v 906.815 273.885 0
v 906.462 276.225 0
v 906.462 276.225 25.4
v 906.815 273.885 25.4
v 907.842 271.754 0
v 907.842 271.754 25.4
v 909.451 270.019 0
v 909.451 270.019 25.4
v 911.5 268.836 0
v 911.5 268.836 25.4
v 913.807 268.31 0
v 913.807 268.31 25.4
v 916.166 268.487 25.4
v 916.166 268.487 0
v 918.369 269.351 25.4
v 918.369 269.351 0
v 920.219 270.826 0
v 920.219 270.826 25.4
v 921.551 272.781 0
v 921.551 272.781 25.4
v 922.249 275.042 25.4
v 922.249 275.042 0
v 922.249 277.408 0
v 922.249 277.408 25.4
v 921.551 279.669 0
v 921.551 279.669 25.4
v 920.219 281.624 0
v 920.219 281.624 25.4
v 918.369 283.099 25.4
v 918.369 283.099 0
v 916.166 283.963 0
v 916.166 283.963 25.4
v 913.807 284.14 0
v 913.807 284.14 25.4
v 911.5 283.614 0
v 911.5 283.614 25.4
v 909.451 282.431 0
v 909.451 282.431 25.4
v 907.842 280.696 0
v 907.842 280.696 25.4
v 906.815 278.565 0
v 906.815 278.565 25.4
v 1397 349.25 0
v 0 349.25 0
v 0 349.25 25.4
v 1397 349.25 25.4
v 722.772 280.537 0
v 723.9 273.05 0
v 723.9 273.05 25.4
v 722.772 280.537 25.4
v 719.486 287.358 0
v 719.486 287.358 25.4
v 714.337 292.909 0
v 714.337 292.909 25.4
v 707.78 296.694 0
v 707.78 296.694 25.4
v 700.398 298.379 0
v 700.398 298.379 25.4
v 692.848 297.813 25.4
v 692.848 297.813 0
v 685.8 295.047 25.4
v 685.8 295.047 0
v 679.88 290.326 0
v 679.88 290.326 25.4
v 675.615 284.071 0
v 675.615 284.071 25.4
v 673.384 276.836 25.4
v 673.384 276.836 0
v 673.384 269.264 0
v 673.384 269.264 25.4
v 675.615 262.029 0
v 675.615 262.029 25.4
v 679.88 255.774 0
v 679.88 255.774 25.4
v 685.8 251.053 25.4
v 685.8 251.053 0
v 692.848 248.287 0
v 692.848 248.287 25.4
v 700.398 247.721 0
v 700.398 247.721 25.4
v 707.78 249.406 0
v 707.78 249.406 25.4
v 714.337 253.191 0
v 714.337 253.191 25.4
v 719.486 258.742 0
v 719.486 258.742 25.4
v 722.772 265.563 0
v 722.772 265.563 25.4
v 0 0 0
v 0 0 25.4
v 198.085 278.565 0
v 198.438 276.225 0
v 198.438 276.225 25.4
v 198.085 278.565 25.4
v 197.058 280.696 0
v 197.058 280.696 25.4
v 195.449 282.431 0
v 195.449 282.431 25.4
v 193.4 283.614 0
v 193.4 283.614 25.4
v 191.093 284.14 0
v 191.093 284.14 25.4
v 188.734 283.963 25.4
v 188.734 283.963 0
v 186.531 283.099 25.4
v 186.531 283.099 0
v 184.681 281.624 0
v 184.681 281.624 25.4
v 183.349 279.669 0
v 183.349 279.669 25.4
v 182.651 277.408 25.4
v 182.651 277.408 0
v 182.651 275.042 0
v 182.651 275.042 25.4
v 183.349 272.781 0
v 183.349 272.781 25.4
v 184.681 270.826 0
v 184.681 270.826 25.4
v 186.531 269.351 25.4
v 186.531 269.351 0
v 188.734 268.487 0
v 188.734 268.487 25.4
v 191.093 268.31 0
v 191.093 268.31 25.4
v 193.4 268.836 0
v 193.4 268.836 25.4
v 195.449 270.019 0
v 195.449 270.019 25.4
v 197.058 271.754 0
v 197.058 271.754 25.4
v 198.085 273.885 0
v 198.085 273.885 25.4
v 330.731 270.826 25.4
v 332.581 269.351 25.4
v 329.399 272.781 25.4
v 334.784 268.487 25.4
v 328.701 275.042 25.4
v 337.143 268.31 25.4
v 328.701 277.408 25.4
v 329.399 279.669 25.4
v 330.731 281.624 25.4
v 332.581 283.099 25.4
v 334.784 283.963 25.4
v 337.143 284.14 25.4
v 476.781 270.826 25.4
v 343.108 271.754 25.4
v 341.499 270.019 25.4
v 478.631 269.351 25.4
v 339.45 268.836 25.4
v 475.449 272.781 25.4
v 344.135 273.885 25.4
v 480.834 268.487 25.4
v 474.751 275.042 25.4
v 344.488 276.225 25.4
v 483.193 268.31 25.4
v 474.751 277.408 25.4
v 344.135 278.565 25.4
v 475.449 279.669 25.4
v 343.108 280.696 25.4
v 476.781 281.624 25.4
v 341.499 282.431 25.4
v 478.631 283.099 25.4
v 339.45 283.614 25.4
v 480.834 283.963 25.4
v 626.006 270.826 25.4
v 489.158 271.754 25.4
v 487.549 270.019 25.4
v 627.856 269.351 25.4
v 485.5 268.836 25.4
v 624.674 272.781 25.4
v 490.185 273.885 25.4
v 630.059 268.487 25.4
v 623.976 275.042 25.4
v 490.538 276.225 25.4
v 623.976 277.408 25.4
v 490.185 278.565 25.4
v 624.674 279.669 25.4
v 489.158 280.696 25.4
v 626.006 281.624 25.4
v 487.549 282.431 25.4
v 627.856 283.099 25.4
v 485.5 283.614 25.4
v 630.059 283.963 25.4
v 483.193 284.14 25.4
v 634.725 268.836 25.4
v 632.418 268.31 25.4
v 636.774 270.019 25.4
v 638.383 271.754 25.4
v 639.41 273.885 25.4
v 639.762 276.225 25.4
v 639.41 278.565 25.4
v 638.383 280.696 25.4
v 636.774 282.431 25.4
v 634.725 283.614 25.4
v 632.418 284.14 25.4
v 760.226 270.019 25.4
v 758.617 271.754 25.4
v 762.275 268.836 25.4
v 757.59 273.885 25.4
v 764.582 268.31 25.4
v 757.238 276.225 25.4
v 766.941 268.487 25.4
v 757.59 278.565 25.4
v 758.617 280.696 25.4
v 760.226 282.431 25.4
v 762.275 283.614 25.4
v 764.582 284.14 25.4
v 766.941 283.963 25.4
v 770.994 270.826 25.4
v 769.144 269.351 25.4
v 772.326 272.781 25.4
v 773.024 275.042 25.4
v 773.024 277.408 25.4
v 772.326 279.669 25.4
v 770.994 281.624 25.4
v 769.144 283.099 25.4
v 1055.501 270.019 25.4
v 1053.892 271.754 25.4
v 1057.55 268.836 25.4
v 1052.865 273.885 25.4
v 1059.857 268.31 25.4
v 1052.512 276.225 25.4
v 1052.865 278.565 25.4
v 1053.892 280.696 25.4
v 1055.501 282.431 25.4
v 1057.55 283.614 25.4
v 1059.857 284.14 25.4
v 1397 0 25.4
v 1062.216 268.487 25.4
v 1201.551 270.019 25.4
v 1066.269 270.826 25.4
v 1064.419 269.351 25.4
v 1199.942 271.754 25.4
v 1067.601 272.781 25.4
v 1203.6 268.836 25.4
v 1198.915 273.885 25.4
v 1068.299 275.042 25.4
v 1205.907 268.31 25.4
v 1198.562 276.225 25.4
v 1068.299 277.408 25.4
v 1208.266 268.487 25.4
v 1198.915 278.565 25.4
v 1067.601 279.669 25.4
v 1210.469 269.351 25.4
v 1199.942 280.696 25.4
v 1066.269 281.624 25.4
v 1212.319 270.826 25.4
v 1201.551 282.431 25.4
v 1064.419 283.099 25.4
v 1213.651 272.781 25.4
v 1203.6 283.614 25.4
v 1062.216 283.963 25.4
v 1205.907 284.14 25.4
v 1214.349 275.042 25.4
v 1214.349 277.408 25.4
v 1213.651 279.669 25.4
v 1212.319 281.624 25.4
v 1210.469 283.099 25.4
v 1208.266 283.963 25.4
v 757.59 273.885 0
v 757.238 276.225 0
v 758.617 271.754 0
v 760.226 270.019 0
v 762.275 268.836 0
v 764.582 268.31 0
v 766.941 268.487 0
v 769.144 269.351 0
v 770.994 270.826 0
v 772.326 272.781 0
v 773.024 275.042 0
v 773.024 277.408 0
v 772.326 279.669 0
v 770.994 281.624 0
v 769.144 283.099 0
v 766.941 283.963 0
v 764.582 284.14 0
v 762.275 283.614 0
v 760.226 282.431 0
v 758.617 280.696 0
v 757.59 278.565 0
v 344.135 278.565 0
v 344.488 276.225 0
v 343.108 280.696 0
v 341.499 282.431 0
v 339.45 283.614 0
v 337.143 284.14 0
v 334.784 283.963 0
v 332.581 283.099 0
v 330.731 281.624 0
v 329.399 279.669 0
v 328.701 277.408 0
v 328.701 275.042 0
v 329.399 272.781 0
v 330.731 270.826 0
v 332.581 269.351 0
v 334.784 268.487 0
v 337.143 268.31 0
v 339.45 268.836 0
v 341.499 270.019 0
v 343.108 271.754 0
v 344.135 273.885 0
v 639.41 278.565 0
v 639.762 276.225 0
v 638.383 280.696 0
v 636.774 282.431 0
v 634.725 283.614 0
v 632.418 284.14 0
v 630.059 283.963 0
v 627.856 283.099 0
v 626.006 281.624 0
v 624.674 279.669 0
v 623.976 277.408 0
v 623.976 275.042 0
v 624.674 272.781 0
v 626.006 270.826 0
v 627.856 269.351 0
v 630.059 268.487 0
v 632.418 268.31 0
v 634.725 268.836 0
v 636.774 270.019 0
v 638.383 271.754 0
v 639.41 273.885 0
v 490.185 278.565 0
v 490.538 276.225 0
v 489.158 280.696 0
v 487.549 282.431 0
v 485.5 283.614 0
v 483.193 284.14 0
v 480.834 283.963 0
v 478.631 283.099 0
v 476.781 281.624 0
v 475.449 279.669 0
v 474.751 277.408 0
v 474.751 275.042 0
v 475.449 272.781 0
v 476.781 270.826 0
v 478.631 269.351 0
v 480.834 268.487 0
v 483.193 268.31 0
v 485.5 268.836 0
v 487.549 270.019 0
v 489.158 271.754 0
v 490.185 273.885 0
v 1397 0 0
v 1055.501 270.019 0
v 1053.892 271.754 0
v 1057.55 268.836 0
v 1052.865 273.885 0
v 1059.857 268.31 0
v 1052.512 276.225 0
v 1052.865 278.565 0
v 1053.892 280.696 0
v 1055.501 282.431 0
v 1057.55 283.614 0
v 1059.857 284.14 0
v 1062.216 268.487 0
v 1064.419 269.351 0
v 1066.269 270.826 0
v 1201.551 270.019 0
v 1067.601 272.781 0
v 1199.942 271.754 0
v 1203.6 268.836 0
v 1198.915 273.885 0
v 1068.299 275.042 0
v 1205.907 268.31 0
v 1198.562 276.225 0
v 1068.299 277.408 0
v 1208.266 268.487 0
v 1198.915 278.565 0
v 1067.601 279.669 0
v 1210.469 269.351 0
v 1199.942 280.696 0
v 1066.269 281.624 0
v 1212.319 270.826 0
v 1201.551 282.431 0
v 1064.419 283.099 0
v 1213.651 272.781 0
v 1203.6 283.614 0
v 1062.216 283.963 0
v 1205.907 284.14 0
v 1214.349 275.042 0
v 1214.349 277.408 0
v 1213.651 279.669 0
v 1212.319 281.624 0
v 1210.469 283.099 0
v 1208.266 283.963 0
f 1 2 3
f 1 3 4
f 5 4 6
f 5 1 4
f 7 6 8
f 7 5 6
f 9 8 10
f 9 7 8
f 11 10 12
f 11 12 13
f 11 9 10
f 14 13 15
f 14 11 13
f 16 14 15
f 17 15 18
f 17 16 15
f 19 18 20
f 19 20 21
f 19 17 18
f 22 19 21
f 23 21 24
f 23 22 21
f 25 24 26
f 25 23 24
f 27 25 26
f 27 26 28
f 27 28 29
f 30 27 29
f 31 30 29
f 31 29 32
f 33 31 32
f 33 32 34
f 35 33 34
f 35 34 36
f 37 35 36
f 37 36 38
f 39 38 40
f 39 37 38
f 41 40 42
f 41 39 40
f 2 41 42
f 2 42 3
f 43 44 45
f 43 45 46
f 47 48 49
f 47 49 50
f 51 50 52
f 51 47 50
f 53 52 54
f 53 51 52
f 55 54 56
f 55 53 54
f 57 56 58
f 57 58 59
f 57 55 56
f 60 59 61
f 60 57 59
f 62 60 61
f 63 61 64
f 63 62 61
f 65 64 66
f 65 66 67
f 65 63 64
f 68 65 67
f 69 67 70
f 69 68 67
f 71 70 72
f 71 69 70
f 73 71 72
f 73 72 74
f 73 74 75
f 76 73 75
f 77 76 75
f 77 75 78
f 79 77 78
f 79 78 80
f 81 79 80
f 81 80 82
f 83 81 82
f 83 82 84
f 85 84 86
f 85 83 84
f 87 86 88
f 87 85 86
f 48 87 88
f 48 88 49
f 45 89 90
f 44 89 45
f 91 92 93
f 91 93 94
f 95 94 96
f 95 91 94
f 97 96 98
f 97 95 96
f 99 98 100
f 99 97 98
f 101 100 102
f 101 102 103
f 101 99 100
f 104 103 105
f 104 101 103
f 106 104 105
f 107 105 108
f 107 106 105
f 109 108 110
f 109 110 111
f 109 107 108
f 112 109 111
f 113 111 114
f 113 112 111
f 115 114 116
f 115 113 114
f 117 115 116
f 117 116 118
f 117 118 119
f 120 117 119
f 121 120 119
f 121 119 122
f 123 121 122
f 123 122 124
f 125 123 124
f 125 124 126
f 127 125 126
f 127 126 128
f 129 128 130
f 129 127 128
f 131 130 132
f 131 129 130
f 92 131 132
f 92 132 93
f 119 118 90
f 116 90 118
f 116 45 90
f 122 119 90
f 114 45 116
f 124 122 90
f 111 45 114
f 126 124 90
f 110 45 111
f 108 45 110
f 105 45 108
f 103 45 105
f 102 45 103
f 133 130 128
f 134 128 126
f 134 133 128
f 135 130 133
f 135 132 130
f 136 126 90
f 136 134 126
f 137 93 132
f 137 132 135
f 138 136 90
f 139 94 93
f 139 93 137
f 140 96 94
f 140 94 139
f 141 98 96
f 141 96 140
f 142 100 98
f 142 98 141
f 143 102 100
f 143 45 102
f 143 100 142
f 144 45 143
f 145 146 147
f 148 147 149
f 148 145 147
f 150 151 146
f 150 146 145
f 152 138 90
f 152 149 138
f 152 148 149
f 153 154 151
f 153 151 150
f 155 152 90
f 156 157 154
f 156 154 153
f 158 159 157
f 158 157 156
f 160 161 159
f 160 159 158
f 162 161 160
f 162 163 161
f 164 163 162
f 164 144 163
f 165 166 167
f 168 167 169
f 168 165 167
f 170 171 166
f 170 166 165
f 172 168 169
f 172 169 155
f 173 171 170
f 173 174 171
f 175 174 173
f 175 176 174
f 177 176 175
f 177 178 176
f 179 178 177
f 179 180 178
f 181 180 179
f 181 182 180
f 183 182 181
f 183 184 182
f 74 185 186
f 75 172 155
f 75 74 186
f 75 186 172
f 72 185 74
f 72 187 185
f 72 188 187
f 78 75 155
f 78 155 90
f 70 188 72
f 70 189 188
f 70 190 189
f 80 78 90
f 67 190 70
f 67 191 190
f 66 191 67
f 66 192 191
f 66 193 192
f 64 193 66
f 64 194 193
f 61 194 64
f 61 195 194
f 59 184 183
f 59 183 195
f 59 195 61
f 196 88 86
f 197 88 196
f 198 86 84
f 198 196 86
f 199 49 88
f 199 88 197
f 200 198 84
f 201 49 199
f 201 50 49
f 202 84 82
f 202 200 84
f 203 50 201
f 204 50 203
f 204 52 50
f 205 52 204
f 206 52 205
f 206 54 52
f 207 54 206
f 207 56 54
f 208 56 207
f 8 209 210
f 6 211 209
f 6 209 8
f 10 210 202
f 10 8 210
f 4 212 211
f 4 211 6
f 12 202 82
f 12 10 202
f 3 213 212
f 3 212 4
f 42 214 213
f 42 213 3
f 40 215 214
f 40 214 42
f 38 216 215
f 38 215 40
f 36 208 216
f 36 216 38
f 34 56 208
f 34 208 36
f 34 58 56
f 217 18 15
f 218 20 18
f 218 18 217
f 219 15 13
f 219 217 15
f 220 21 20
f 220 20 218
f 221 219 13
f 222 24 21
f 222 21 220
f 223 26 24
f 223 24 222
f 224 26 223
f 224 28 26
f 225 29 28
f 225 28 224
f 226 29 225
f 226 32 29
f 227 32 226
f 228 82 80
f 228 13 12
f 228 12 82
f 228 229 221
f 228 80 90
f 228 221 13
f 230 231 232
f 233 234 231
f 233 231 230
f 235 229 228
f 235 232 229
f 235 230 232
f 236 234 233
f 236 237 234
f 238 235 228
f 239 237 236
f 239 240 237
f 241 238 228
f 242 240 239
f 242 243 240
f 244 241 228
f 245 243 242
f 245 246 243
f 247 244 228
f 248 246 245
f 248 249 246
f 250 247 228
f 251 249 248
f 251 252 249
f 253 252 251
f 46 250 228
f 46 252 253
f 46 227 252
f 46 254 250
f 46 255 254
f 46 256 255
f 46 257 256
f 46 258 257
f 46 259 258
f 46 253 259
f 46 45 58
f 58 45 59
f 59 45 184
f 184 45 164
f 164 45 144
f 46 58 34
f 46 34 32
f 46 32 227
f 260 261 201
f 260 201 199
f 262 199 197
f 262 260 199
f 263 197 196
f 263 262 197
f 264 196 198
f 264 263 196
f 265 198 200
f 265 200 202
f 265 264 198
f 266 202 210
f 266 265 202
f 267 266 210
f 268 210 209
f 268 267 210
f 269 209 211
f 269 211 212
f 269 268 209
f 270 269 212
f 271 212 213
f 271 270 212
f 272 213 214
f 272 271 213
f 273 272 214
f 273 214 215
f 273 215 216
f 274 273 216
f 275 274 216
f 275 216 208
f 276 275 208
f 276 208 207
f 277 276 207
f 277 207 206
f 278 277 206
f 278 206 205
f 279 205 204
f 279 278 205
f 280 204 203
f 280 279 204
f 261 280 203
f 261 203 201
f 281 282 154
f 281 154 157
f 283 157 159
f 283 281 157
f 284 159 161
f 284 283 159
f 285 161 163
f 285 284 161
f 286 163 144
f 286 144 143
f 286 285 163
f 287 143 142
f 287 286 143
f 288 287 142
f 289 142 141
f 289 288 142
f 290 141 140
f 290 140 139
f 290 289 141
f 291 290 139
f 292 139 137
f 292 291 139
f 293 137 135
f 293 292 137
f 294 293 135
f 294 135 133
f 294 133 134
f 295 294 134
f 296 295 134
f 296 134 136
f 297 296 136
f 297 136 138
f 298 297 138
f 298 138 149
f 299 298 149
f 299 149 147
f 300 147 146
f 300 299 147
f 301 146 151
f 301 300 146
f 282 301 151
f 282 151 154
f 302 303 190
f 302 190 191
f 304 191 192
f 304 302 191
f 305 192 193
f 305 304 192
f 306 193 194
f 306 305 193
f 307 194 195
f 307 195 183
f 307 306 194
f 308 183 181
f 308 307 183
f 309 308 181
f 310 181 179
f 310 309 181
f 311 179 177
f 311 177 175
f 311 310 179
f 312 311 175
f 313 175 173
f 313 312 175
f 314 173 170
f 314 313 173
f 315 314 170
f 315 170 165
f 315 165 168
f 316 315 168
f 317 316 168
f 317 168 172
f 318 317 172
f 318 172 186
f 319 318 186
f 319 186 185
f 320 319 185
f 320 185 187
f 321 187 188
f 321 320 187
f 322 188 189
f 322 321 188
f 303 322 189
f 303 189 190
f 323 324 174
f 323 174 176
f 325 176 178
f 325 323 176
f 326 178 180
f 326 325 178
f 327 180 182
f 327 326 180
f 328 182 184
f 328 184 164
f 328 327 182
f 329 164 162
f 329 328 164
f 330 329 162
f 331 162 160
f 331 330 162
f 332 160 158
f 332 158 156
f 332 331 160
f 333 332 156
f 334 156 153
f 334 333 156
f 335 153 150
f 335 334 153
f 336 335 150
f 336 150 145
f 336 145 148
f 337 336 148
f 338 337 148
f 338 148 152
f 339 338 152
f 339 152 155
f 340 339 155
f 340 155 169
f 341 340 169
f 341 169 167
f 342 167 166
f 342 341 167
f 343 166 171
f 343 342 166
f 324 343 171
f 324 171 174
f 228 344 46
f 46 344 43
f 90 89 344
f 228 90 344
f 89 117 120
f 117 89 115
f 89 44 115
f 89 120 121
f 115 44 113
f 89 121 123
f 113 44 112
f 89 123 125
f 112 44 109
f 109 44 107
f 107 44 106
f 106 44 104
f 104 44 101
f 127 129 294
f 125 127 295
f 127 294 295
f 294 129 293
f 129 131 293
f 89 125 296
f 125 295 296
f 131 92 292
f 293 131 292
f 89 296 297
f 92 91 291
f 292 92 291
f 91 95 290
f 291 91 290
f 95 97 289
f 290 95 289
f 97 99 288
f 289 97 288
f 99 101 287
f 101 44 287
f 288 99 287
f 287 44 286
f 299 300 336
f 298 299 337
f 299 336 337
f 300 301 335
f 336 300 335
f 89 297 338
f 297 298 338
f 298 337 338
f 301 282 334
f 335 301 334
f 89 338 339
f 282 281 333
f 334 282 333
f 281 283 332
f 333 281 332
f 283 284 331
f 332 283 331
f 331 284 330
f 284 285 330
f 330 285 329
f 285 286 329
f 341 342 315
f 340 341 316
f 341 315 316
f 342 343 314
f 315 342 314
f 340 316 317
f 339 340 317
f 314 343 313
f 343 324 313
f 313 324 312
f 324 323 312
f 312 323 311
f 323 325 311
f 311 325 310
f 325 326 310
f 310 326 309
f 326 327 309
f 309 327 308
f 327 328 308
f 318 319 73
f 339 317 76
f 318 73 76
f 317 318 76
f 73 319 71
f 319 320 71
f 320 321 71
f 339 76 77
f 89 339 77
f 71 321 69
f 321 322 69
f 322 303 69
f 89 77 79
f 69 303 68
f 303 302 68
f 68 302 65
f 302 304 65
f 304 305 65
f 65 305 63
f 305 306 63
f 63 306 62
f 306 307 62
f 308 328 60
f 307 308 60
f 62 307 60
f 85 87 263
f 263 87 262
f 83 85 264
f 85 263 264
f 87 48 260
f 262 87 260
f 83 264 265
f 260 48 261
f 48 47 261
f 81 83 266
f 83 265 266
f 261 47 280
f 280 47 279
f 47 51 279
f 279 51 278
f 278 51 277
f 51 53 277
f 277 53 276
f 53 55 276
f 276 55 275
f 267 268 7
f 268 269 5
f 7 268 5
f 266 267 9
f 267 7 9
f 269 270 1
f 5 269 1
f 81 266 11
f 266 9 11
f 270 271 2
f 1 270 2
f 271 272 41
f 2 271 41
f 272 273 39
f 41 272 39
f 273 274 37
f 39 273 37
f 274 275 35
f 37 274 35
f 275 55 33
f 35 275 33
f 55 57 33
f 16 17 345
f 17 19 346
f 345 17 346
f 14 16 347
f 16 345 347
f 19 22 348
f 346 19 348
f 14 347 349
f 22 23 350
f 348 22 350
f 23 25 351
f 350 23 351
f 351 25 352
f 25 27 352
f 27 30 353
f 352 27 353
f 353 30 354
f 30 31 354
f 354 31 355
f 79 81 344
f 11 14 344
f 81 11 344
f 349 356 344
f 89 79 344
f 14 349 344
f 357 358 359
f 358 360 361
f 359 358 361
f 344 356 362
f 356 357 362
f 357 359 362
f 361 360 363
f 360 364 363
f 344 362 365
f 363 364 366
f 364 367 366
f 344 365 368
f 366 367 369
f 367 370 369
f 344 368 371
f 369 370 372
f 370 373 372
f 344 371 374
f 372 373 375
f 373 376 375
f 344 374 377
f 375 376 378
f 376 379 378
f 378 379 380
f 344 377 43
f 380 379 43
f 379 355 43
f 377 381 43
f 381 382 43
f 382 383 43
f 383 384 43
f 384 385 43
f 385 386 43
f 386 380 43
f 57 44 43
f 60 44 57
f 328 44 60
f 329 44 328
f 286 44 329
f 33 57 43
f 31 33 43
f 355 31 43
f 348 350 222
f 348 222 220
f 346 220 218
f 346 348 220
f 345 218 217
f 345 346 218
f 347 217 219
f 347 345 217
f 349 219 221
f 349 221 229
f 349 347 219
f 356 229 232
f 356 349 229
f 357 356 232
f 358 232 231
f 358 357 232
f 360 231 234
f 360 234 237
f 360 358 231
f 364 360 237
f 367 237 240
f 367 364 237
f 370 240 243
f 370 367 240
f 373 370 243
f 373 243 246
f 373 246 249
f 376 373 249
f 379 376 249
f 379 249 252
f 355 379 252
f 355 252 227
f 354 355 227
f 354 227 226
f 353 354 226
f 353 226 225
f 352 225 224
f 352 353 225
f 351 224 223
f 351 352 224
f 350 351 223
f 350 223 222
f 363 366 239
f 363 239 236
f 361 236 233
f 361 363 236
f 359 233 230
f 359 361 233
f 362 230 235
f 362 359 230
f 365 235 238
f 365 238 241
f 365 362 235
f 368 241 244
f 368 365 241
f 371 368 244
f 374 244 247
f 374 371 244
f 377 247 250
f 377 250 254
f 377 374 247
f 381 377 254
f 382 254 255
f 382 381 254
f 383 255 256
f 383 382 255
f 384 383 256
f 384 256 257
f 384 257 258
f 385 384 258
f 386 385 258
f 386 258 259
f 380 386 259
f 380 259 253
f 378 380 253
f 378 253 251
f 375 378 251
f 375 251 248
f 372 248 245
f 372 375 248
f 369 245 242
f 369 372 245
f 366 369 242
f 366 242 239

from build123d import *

# Parameters (mm, degrees)
SKETCH1_W           = 1397
SKETCH1_H           = 349.25
SKETCH1_R           = 25.4
SKETCH1_R_2         = 7.9375
BOSS_EXTRUDE1_DEPTH = 25.4


with BuildPart() as part:
    # Sketch1 → Boss-Extrude1 (new body)
    with BuildSketch(Plane.XY):
        with Locations((698.5, 174.625)):
            Rectangle(SKETCH1_W, SKETCH1_H)
        with Locations((698.5, 273.05)):
            Circle(SKETCH1_R, mode=Mode.SUBTRACT)
        with Locations((190.5, 276.225)):
            Circle(SKETCH1_R_2, mode=Mode.SUBTRACT)
        with Locations((336.55, 276.225)):
            Circle(SKETCH1_R_2, mode=Mode.SUBTRACT)
        with Locations((482.6, 276.225)):
            Circle(SKETCH1_R_2, mode=Mode.SUBTRACT)
        with Locations((631.825, 276.225)):
            Circle(SKETCH1_R_2, mode=Mode.SUBTRACT)
        with Locations(Location((1206.5, 276.225, 0), (0, 0, 180))):
            Circle(SKETCH1_R_2, mode=Mode.SUBTRACT)
        with Locations(Location((1060.45, 276.225, 0), (0, 0, 180))):
            Circle(SKETCH1_R_2, mode=Mode.SUBTRACT)
        with Locations(Location((914.4, 276.225, 0), (0, 0, 180))):
            Circle(SKETCH1_R_2, mode=Mode.SUBTRACT)
        with Locations(Location((765.175, 276.225, 0), (0, 0, 180))):
            Circle(SKETCH1_R_2, mode=Mode.SUBTRACT)
    extrude(amount=BOSS_EXTRUDE1_DEPTH)


solid = part.part
